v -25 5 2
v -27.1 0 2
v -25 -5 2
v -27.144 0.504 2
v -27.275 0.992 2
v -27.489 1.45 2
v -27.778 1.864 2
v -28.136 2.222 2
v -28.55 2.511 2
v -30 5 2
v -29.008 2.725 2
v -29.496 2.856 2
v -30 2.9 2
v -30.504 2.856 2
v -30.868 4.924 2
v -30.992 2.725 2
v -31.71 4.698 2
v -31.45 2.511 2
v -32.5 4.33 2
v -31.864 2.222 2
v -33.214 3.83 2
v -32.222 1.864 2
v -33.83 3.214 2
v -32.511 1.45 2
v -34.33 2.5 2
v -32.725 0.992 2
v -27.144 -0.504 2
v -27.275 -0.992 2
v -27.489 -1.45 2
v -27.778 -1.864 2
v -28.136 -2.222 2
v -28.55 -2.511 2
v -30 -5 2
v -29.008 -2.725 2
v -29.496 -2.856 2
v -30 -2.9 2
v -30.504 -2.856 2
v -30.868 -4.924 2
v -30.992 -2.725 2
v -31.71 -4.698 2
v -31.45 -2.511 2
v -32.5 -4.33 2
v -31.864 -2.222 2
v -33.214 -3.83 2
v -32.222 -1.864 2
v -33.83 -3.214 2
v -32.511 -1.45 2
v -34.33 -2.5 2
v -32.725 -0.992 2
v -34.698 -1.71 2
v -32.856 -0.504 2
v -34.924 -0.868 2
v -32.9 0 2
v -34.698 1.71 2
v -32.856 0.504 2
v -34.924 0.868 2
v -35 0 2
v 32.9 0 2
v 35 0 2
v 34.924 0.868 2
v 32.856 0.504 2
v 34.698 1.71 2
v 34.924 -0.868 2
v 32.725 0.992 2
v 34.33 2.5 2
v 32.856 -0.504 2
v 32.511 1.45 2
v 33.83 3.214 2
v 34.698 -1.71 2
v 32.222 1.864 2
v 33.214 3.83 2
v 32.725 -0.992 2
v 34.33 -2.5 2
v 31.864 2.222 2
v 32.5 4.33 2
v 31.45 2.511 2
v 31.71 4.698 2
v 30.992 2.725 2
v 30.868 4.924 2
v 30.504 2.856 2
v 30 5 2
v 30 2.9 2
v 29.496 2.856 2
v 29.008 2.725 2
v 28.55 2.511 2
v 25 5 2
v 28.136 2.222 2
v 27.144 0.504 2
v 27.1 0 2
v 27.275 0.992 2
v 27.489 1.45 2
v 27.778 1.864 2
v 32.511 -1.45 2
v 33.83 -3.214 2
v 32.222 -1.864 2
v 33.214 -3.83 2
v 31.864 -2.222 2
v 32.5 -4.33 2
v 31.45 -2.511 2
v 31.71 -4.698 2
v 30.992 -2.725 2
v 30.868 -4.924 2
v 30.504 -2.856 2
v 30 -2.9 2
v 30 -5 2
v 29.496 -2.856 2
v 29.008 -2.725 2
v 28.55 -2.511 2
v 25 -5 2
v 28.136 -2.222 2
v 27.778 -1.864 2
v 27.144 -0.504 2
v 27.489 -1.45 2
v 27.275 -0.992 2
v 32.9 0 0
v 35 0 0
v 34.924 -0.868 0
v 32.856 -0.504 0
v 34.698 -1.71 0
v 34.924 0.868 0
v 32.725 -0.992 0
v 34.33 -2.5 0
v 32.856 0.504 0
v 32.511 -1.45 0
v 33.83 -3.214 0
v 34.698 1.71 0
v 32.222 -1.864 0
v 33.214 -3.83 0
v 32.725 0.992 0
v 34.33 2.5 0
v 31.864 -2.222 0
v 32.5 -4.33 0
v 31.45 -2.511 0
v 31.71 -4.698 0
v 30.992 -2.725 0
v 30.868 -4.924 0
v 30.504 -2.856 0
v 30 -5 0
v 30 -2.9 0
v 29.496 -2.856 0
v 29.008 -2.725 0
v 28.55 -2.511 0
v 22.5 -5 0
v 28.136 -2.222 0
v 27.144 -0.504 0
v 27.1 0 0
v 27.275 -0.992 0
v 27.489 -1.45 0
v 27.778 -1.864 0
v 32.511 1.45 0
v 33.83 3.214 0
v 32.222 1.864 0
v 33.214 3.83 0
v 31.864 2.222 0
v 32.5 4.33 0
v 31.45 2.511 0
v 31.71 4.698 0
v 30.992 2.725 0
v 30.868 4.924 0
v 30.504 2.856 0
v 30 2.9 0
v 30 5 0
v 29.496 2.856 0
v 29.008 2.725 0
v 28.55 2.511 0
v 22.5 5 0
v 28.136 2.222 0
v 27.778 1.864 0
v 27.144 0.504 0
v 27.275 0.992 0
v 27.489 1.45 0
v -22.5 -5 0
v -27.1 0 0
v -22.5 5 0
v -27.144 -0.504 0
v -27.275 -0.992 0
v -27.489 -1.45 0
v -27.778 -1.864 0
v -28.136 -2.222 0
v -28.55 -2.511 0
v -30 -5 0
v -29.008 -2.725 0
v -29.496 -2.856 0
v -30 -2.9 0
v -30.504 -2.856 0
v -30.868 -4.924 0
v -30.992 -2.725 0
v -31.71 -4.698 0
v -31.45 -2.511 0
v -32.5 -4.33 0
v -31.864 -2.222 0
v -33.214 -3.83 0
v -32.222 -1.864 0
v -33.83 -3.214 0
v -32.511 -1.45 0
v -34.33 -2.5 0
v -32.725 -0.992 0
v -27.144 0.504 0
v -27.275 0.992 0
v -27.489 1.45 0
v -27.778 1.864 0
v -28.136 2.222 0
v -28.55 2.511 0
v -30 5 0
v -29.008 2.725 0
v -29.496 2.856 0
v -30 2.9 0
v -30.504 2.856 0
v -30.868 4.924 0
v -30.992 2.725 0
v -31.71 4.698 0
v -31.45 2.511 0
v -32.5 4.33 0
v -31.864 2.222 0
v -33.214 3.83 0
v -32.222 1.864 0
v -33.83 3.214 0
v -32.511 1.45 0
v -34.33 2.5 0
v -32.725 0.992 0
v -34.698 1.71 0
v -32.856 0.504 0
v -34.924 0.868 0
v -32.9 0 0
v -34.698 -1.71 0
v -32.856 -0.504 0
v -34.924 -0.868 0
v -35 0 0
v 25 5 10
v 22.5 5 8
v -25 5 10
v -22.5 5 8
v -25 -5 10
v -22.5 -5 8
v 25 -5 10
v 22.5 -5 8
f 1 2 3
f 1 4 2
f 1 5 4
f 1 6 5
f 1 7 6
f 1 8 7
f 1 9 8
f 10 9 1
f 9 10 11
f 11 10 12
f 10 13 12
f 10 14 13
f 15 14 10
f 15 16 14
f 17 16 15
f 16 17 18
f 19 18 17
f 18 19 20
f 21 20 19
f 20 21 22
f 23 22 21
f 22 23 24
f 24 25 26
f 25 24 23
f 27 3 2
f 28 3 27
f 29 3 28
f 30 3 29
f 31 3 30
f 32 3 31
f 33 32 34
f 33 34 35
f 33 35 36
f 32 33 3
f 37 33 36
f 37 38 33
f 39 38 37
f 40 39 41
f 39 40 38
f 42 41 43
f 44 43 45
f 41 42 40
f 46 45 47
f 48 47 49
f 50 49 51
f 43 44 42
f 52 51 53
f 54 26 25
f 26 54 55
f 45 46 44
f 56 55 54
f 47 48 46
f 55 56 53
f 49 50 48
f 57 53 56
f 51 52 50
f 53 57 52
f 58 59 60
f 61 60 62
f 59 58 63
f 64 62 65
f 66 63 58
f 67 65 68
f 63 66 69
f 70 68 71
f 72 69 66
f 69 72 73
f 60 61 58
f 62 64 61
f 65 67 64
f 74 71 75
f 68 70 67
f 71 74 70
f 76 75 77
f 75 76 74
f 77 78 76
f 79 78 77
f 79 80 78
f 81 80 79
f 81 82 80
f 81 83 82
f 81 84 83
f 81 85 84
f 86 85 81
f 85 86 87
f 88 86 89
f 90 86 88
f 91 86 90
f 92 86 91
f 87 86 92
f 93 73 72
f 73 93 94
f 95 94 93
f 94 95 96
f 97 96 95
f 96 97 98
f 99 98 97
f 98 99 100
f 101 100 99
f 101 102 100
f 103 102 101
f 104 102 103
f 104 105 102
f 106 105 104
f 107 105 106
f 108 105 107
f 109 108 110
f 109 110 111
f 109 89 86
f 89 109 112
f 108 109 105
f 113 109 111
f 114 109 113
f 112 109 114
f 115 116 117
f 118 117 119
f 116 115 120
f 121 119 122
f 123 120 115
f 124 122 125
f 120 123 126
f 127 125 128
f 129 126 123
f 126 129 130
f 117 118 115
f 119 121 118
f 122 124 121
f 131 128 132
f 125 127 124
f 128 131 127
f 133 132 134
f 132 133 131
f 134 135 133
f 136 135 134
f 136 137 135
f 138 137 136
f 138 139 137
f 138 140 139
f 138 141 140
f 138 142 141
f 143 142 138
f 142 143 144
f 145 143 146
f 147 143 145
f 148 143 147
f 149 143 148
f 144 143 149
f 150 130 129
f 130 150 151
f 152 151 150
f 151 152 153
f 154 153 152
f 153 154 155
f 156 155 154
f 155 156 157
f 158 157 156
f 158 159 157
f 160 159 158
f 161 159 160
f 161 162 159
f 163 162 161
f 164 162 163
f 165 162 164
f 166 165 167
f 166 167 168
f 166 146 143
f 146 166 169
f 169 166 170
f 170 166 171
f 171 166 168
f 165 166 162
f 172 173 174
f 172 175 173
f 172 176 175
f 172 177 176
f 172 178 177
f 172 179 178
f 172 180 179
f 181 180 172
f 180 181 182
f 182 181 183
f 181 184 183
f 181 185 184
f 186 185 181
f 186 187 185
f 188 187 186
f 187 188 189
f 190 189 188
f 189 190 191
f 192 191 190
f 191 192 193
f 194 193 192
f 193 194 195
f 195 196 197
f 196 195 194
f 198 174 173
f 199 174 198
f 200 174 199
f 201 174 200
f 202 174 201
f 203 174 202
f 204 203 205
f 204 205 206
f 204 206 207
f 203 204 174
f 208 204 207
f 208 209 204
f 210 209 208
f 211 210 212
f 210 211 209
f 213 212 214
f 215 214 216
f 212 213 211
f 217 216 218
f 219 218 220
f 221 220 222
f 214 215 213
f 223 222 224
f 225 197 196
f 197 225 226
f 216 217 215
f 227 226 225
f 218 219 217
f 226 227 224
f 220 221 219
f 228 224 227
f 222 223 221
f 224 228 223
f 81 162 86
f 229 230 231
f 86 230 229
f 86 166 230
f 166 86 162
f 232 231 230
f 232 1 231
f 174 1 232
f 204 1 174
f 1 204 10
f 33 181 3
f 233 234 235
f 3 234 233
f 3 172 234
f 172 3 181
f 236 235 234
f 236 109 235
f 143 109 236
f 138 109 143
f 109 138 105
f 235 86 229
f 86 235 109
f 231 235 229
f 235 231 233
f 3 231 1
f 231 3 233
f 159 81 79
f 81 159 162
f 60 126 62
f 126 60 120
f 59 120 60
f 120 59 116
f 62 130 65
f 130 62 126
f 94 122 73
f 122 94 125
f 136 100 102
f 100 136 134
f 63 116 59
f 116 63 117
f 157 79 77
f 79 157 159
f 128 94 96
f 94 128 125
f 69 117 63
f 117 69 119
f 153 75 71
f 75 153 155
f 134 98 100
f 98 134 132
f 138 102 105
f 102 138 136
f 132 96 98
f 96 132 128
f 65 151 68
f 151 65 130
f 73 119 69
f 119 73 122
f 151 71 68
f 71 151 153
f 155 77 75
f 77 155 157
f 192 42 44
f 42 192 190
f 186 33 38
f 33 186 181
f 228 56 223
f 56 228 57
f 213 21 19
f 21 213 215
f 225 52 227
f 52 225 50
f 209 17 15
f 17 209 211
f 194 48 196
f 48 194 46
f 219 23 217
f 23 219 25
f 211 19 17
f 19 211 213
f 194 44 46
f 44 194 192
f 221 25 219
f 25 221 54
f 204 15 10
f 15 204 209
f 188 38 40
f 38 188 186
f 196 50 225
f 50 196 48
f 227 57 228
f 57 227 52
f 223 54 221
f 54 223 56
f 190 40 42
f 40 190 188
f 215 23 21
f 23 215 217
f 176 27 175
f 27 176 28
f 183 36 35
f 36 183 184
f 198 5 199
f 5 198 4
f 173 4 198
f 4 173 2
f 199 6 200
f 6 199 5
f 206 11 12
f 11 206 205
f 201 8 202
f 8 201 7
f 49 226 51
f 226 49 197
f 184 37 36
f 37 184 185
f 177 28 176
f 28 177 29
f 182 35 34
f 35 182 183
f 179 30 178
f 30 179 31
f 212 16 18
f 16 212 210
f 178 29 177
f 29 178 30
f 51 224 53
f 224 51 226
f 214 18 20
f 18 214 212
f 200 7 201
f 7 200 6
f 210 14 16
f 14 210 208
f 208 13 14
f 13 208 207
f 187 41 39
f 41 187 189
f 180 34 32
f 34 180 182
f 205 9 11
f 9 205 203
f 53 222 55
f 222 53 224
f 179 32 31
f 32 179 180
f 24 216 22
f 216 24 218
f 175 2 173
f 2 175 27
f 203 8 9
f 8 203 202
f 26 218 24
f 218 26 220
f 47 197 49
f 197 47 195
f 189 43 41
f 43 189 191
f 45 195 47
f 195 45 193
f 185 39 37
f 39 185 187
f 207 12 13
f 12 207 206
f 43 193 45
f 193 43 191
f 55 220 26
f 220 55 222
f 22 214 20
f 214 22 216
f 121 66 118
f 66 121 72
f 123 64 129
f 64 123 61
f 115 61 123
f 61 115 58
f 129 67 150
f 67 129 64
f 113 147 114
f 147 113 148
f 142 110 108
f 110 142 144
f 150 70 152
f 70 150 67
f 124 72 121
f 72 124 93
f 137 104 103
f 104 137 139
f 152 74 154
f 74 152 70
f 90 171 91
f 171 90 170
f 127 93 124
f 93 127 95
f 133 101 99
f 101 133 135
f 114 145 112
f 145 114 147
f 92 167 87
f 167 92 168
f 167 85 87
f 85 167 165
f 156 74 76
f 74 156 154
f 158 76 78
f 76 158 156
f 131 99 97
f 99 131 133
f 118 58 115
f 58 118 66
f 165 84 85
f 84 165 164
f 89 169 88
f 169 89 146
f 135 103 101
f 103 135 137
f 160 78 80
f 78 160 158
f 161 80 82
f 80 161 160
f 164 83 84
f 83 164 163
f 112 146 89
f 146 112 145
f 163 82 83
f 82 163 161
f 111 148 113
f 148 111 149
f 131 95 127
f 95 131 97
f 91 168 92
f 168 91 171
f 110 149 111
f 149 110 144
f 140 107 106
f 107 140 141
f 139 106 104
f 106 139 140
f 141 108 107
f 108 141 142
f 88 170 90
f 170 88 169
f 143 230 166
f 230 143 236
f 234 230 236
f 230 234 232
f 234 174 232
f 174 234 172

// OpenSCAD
/*
Hi, this is my simple battery holder for many RC models. 
I made it for my Stampede 2WD in order to use a hardcase 4000mah 3s Batterie (Absima).
Turn it on the side for printing.
Greetings Daniel aka odiworst
*/

z = 2; //thickness (in mm)
x = 60; //width (centre of holes)
y = 10; //depth (in mm)
s = 8; //shift in hight compared with original holder / zero level 
w = 45; //width of cut away
r = 2.9; //radius of holes


difference(){       
        union(){
            translate ([-x/2,-y/2,0])   cube(size = [x,y,z], center = false);            //ground plate
            translate ([-(x-10)/2,-y/2,0])   cube(size = [x-10,y,z+s], center = false);  //upper block
            translate ([x/2,0,0])       cylinder(z,y/2,y/2, center=false, $fn=36);
            translate ([-x/2,0,0])       cylinder(z,y/2,y/2, center=false, $fn=36);
                  }
  ;  
    union(){
        translate ([-x/2,0,0])       cylinder(z,r,r, center=false, $fn=36);     //hole1
        translate ([x/2,0,0])       cylinder(z,r,r, center=false, $fn=36);      //hole2
        translate ([-w/2,-y/2,0])    cube(size = [w,y,s], center = false);     //cut away
  }}
